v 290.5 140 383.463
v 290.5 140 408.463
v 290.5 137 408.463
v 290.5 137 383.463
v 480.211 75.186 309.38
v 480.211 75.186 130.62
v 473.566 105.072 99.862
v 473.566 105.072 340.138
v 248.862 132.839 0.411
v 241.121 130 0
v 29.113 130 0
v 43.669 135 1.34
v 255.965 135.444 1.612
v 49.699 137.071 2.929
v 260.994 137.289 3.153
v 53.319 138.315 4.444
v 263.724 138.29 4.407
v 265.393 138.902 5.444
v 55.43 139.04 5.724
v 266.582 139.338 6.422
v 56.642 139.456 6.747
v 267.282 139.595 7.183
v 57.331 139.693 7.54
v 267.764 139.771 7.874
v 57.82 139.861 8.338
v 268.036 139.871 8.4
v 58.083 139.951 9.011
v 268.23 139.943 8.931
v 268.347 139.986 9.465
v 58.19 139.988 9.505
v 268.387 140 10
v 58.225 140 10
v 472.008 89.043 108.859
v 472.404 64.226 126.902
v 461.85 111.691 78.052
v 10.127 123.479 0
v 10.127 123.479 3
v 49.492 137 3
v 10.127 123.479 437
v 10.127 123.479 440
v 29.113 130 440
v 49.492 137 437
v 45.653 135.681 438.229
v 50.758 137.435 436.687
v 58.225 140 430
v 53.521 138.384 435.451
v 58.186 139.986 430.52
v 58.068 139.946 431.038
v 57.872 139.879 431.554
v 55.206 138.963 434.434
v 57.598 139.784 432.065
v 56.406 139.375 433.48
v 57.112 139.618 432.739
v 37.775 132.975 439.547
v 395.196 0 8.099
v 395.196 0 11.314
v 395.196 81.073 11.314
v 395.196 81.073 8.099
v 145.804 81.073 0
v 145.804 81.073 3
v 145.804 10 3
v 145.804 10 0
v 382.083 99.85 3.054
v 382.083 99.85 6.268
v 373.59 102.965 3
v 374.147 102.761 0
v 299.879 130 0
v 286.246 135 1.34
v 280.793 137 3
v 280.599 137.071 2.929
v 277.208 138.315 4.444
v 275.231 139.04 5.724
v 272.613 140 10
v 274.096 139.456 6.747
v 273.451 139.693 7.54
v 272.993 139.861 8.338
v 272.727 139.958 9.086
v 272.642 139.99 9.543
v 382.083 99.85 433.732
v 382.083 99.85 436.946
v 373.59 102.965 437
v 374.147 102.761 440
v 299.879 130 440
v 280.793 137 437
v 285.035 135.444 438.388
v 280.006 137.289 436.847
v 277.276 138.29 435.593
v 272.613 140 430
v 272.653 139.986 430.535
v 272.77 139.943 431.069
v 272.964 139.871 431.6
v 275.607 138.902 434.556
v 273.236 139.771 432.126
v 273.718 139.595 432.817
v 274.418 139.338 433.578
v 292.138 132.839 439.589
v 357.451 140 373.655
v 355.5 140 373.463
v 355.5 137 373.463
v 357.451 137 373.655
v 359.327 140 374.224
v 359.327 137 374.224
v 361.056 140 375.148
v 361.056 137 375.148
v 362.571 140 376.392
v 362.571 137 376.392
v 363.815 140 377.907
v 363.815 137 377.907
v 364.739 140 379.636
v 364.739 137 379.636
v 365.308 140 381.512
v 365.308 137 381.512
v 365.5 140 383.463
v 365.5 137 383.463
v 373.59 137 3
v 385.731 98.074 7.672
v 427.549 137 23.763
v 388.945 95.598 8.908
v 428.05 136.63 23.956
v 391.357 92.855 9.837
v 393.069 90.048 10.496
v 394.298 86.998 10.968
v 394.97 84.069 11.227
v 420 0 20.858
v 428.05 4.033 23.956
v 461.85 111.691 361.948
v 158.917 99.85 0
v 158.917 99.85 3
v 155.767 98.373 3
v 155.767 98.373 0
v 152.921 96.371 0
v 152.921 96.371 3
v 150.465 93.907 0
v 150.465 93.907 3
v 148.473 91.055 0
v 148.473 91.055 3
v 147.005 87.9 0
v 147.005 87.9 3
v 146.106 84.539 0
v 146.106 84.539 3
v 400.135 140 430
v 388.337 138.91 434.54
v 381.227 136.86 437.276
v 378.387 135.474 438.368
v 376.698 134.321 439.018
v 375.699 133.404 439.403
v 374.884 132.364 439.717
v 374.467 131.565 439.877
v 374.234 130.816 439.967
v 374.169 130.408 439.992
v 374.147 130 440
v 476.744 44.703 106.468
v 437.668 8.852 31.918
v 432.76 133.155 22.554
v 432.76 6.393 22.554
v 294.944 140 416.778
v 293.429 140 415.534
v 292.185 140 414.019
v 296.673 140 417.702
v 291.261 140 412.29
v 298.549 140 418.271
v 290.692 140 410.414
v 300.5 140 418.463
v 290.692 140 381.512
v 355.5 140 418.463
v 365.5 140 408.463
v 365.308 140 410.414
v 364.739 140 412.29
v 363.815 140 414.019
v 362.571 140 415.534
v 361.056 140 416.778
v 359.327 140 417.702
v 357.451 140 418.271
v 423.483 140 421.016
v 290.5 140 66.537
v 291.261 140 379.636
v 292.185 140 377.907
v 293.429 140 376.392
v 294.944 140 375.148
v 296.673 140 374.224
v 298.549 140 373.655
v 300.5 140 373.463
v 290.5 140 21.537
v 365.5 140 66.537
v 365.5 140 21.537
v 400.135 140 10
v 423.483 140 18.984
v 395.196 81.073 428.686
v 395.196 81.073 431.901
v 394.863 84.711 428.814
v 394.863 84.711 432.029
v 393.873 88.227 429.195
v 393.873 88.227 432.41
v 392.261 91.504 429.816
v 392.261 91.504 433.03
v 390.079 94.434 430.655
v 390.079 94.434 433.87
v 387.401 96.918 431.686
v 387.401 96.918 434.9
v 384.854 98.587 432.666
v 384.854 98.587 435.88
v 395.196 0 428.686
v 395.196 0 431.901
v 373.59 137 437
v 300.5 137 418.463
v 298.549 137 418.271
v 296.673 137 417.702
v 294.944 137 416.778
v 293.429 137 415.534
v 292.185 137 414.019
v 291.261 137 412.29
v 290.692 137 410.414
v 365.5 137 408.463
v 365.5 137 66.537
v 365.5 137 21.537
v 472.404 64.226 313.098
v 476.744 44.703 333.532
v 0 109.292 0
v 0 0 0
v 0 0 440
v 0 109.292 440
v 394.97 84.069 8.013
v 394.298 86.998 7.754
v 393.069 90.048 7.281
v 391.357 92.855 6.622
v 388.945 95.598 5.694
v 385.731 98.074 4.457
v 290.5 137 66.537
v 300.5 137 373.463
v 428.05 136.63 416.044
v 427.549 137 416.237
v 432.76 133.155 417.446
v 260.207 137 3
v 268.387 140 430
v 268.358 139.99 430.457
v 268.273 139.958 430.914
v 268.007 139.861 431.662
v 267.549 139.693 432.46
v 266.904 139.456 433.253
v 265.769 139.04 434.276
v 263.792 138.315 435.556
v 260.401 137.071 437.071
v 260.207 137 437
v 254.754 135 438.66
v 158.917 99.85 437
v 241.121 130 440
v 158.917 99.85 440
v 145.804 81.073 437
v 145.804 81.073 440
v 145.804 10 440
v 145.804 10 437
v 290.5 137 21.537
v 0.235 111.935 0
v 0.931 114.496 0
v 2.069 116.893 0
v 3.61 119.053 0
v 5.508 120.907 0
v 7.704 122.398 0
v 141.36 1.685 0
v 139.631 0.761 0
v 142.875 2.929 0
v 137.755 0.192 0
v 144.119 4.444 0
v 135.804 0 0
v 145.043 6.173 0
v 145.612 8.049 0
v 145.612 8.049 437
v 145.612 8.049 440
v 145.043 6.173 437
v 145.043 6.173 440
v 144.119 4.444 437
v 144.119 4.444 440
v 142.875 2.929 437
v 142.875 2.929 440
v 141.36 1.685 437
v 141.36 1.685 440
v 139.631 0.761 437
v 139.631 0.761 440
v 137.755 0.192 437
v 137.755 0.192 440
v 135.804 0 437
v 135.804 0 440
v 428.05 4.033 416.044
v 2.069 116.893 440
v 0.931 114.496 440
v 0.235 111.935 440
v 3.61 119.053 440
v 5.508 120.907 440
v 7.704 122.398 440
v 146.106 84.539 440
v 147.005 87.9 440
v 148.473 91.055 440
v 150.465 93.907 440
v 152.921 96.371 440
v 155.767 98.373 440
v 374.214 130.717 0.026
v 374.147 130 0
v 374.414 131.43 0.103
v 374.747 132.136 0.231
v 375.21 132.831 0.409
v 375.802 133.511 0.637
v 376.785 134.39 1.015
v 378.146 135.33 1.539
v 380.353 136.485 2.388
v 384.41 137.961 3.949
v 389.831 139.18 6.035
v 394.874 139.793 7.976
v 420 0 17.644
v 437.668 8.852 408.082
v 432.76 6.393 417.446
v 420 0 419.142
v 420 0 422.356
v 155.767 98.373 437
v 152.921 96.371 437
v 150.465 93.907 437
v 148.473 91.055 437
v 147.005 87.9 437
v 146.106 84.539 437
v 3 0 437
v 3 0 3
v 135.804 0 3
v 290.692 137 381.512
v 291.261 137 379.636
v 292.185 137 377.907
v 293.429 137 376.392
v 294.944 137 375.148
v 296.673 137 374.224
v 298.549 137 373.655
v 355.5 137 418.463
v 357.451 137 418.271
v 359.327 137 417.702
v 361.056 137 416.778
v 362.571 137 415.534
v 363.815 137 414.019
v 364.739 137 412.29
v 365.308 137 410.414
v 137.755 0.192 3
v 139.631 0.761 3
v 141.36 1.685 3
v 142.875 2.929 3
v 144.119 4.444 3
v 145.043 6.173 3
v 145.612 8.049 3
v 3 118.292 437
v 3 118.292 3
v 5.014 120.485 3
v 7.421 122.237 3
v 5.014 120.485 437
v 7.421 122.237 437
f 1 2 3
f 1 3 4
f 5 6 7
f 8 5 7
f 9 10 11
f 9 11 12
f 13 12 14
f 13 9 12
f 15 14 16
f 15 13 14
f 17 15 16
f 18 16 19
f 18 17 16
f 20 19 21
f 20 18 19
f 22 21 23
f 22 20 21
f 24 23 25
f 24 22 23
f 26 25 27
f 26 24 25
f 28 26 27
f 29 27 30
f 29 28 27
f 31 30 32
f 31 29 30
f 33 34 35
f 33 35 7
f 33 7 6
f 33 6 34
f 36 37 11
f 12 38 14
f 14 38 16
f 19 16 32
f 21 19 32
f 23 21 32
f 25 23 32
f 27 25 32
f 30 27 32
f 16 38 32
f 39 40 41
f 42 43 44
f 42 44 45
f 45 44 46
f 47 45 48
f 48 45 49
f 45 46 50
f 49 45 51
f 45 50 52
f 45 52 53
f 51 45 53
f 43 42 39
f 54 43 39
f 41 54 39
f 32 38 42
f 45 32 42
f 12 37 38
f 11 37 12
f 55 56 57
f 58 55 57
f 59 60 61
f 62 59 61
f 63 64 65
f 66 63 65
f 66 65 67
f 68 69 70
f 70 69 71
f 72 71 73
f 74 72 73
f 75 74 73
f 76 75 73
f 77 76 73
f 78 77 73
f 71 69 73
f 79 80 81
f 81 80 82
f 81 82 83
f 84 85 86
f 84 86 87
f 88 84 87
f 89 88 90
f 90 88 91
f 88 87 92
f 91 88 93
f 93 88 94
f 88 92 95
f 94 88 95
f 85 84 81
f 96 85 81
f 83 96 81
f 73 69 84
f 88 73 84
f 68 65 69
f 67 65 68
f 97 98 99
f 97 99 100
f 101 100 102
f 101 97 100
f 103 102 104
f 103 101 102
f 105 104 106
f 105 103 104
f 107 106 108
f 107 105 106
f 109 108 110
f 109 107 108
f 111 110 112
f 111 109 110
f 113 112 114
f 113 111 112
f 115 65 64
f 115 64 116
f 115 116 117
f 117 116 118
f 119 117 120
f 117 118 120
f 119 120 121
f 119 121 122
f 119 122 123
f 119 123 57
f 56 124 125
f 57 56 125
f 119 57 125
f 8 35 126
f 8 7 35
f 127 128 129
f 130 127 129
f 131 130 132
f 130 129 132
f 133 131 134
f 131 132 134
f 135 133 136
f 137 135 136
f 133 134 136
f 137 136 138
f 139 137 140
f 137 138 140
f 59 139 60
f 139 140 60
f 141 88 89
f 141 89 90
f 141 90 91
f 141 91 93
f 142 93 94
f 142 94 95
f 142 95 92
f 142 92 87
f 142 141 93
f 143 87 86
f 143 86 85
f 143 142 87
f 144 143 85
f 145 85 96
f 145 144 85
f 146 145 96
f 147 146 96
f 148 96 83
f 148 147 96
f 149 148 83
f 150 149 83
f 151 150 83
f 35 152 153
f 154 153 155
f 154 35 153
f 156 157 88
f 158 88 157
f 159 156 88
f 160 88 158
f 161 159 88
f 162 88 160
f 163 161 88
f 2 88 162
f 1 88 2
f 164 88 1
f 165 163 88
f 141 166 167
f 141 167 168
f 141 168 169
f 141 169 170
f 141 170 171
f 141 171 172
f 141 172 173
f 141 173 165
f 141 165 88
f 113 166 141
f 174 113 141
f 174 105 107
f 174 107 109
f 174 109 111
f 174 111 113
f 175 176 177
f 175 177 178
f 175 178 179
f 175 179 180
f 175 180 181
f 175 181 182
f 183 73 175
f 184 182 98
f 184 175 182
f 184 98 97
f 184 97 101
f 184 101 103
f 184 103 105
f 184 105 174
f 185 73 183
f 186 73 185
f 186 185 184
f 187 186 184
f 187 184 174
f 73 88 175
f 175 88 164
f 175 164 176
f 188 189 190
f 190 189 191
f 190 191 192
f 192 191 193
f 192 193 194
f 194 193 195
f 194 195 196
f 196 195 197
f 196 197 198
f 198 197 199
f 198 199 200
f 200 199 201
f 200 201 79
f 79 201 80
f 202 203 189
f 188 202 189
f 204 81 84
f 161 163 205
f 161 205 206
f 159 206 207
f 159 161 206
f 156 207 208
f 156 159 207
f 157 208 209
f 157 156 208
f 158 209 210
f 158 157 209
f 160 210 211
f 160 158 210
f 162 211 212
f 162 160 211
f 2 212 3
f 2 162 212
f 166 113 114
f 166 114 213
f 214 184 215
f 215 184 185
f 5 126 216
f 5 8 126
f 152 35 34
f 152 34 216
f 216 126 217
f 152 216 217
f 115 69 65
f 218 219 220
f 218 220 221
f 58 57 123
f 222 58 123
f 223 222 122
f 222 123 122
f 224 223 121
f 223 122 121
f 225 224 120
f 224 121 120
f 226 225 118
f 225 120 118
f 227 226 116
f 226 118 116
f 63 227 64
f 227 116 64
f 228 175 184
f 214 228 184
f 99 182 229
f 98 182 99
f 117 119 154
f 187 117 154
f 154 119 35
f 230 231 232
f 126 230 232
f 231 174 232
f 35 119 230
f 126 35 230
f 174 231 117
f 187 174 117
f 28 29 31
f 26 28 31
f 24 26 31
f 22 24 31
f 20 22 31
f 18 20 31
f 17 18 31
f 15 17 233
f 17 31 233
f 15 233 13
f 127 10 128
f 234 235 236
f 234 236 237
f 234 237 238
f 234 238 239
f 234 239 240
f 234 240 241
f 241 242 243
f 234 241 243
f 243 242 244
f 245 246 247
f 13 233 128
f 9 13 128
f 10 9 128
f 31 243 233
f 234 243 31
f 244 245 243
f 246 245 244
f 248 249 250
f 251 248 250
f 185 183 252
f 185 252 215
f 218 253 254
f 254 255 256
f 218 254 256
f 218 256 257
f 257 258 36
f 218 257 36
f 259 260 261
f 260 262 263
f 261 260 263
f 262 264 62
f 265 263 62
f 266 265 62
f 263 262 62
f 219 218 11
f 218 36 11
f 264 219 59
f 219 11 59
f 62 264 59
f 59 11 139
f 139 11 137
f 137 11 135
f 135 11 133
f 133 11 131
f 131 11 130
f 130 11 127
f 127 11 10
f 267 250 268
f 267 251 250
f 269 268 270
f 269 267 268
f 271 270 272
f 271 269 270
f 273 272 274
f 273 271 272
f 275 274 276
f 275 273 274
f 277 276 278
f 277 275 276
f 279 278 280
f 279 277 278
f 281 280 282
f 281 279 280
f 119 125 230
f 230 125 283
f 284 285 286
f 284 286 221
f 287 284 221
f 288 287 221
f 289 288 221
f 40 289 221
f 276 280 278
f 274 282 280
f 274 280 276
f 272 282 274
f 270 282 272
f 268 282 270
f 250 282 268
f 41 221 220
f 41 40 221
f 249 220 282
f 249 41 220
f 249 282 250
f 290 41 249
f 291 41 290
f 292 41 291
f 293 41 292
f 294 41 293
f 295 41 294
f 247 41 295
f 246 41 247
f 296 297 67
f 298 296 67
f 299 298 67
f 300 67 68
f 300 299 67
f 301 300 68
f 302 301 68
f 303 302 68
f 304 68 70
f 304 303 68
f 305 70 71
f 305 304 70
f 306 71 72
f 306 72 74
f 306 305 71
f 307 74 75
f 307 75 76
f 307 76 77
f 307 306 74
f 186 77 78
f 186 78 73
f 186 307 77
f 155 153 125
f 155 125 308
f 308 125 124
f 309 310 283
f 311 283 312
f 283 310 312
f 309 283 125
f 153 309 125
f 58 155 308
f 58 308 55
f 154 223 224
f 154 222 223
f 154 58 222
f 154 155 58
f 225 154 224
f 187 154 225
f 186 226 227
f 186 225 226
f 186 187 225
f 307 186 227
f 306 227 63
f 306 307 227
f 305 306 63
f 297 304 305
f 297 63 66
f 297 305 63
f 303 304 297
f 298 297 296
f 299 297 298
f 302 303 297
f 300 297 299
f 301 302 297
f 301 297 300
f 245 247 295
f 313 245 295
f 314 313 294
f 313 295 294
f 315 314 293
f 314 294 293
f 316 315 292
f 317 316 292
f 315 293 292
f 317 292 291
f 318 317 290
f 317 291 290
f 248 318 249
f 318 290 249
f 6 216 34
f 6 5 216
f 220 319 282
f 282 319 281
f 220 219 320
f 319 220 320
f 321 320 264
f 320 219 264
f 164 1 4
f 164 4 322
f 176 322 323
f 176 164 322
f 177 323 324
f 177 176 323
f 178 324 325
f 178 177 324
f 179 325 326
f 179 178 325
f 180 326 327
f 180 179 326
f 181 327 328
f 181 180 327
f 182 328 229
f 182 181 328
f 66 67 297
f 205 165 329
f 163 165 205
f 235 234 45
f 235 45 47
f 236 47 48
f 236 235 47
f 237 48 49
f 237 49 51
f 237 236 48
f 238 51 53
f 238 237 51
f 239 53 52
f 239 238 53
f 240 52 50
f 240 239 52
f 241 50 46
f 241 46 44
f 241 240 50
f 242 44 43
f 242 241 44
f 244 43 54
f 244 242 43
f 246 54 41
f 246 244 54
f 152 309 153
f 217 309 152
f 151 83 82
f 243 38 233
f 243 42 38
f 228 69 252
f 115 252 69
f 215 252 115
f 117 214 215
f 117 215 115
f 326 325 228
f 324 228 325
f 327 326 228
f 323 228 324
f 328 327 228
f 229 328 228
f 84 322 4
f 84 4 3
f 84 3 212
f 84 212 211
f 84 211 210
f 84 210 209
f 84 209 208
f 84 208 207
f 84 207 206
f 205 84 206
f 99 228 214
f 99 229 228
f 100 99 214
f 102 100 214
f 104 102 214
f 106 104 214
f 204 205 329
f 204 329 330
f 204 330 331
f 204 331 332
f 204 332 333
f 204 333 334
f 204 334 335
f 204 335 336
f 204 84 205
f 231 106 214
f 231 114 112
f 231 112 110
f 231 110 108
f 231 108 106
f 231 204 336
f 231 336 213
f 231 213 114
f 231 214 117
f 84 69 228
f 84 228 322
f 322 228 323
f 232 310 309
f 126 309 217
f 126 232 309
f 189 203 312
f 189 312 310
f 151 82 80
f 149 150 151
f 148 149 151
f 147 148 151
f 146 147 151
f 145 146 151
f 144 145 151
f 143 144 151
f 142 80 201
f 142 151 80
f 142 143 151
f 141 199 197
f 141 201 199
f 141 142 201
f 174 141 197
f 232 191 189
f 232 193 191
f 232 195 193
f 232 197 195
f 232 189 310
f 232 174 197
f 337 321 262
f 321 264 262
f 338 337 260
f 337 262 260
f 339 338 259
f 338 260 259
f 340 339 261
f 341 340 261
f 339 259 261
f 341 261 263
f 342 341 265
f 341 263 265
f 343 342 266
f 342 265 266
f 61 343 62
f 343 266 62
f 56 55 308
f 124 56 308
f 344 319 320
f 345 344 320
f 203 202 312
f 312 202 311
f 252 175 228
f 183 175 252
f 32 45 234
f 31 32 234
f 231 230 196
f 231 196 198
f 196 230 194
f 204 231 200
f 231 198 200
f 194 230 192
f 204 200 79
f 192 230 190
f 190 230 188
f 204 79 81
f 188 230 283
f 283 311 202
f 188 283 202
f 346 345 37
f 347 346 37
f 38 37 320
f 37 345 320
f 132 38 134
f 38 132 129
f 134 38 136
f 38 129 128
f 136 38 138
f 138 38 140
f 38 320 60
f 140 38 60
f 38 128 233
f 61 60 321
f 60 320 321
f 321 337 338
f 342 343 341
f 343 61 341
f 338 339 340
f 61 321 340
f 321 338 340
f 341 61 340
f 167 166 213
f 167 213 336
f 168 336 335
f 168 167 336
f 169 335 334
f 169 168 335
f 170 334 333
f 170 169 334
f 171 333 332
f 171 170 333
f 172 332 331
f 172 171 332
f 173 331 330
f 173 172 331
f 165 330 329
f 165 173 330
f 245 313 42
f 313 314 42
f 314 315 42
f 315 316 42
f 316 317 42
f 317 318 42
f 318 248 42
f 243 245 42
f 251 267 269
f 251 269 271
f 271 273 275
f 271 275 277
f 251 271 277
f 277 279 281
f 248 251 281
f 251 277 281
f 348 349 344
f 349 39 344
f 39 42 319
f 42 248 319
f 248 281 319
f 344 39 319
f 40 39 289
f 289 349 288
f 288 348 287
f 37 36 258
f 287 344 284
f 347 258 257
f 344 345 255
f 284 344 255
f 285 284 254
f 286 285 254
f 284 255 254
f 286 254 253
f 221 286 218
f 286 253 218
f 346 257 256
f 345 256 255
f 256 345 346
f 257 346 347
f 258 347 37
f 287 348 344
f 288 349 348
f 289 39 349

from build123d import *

# Parameters (mm, degrees)
SKETCH1_W           = 480
SKETCH1_H           = 140
BOSS_EXTRUDE1_DEPTH = 440
CUT_EXTRUDE2_DEPTH  = 441
CHAMFER1_SIZE       = 15
CHAMFER1_SIZE2      = 47.347217079
CUT_EXTRUDE3_DEPTH  = 335
FILLET1_R           = 10
FILLET2_R           = 15
BOSS_EXTRUDE2_DEPTH = 10
BOSS_EXTRUDE2_TAPER = 42
CUT_EXTRUDE4_DEPTH  = 137
SKETCH8_W           = 75
SKETCH8_H           = 45
CUT_EXTRUDE5_DEPTH  = 10
CUT_EXTRUDE6_DEPTH  = 674
CUT_EXTRUDE7_DEPTH  = 441
FILLET3_R           = 10


with BuildPart() as part:
    # Sketch1 → Boss-Extrude1 (new body)
    with BuildSketch(Plane.XY):
        with Locations((240, 70)):
            Rectangle(SKETCH1_W, SKETCH1_H)
    extrude(amount=BOSS_EXTRUDE1_DEPTH)

    # Sketch3 → Cut-Extrude2 (cut, through all)
    with BuildSketch(Plane.XY.offset(440)):
        Polygon((0, 120), (58.225421292, 140), (423.483139802, 140), (461.850368806, 111.690568425), (480, 30.060272778), (420, 0), (591.519627261, 0), (591.519627261, 186.002843458), (0, 186.002843458), align=None)
    extrude(amount=-CUT_EXTRUDE2_DEPTH, mode=Mode.SUBTRACT)

    # Chamfer1
    chamfer1_edges = [part.edges().sort_by_distance(p)[0] for p in [
        (480, 30.060272778, 220),
    ]]
    chamfer1_side = [part.faces().sort_by_distance(p)[0] for p in [
        (470.925184403, 70.875420602, 220),
    ]]
    chamfer(chamfer1_edges, length=CHAMFER1_SIZE, length2=CHAMFER1_SIZE2, reference=chamfer1_side[0])

    # Sketch4 → Cut-Extrude3 (cut)
    with BuildSketch(Plane(origin=(0, 140, 0), x_dir=(1, 0, 0), z_dir=(0, 1, 0))):
        Polygon((476.744408085, -333.53246978), (476.744408085, -106.46753022), (432.760156683, -22.553519937), (374.146970562, 0), (571.445259905, 0), (571.445259905, -440), (374.146970562, -440), (432.760156683, -417.446480063), align=None)
    extrude(amount=-CUT_EXTRUDE3_DEPTH, mode=Mode.SUBTRACT)

    # Fillet1
    fillet1_edges = [part.edges().sort_by_distance(p)[0] for p in [
        (216.186195927, 140, 0),
        (216.186195927, 140, 440),
    ]]
    fillet(fillet1_edges, radius=FILLET1_R)

    # Fillet2
    fillet2_edges = [part.edges().sort_by_distance(p)[0] for p in [
        (0, 120, 220),
    ]]
    fillet(fillet2_edges, radius=FILLET2_R)

    # Sketch6 → Boss-Extrude2 (add)
    with BuildSketch(Plane(origin=(463.757804126, 103.111633269, 0), x_dir=(0, 0, -1), z_dir=(0.976162831, 0.217039461, 0))):
        Polygon((-361.947607595, 8.788426361), (-313.097540887, -39.835220293), (-126.902459113, -39.835220293), (-78.052392405, 8.788426361), align=None)
    extrude(amount=BOSS_EXTRUDE2_DEPTH, taper=BOSS_EXTRUDE2_TAPER)

    # Sketch7 → Cut-Extrude4 (cut)
    with BuildSketch(Plane.XZ):
        Polygon((428.050265386, 416.044352233), (373.589707288, 437), (3, 437), (3, 3), (373.589707288, 3), (428.050265386, 23.955647767), align=None)
    extrude(amount=-CUT_EXTRUDE4_DEPTH, mode=Mode.SUBTRACT)

    # Sketch8 → Cut-Extrude5 (cut)
    with BuildSketch(Plane(origin=(0, 140, 0), x_dir=(1, 0, 0), z_dir=(0, 1, 0))):
        with BuildLine():
            Line((300.5, -373.462859875), (355.5, -373.462859875))
            ThreePointArc((355.5, -373.462859875), (362.571067812, -376.391792064), (365.5, -383.462859875))
            Line((365.5, -383.462859875), (365.5, -408.462859875))
            ThreePointArc((365.5, -408.462859875), (362.571067812, -415.533927687), (355.5, -418.462859875))
            Line((355.5, -418.462859875), (300.5, -418.462859875))
            ThreePointArc((300.5, -418.462859875), (293.428932188, -415.533927687), (290.5, -408.462859875))
            Line((290.5, -408.462859875), (290.5, -383.462859875))
            ThreePointArc((290.5, -383.462859875), (293.428932188, -376.391792064), (300.5, -373.462859875))
        make_face()
        with Locations((328, -44.037140125)):
            Rectangle(SKETCH8_W, SKETCH8_H)
    extrude(amount=-CUT_EXTRUDE5_DEPTH, mode=Mode.SUBTRACT)

    # Sketch9 → Cut-Extrude6 (cut)
    with BuildSketch(Plane.XY.offset(440)):
        with BuildLine():
            Line((270.5, 140.775139833), (158.917057954, 99.850098536))
            ThreePointArc((158.917057954, 99.850098536), (149.406641197, 92.524488549), (145.803826482, 81.07318667))
            Line((145.803826482, 81.07318667), (145.803826482, 0))
            Line((145.803826482, 0), (395.196173518, 0))
            Line((395.196173518, 0), (395.196173518, 81.07318667))
            ThreePointArc((395.196173518, 81.07318667), (391.593358803, 92.524488549), (382.082942046, 99.850098536))
            Line((382.082942046, 99.850098536), (270.5, 140.775139833))
        make_face()
    extrude(amount=-CUT_EXTRUDE6_DEPTH, mode=Mode.SUBTRACT)

    # Sketch10 → Cut-Extrude7 (cut, through all)
    with BuildSketch(Plane.XY.offset(440)):
        with BuildLine():
            Line((360.196173518, 33.996583279), (319.600106703, 53.851341534))
            ThreePointArc((319.600106703, 53.851341534), (323.689977769, 50.162754432), (325.206613776, 44.8681784))
            Line((325.206613776, 44.8681784), (325.206613776, 0))
            Line((325.206613776, 0), (360.196173518, 0))
            Line((360.196173518, 0), (360.196173518, 33.996583279))
        make_face()
    extrude(amount=-CUT_EXTRUDE7_DEPTH, mode=Mode.SUBTRACT)

    # Fillet3
    fillet3_edges = [part.edges().sort_by_distance(p)[0] for p in [
        (145.803826482, 0, 1.5),
        (145.803826482, 0, 438.5),
    ]]
    fillet(fillet3_edges, radius=FILLET3_R)


solid = part.part
